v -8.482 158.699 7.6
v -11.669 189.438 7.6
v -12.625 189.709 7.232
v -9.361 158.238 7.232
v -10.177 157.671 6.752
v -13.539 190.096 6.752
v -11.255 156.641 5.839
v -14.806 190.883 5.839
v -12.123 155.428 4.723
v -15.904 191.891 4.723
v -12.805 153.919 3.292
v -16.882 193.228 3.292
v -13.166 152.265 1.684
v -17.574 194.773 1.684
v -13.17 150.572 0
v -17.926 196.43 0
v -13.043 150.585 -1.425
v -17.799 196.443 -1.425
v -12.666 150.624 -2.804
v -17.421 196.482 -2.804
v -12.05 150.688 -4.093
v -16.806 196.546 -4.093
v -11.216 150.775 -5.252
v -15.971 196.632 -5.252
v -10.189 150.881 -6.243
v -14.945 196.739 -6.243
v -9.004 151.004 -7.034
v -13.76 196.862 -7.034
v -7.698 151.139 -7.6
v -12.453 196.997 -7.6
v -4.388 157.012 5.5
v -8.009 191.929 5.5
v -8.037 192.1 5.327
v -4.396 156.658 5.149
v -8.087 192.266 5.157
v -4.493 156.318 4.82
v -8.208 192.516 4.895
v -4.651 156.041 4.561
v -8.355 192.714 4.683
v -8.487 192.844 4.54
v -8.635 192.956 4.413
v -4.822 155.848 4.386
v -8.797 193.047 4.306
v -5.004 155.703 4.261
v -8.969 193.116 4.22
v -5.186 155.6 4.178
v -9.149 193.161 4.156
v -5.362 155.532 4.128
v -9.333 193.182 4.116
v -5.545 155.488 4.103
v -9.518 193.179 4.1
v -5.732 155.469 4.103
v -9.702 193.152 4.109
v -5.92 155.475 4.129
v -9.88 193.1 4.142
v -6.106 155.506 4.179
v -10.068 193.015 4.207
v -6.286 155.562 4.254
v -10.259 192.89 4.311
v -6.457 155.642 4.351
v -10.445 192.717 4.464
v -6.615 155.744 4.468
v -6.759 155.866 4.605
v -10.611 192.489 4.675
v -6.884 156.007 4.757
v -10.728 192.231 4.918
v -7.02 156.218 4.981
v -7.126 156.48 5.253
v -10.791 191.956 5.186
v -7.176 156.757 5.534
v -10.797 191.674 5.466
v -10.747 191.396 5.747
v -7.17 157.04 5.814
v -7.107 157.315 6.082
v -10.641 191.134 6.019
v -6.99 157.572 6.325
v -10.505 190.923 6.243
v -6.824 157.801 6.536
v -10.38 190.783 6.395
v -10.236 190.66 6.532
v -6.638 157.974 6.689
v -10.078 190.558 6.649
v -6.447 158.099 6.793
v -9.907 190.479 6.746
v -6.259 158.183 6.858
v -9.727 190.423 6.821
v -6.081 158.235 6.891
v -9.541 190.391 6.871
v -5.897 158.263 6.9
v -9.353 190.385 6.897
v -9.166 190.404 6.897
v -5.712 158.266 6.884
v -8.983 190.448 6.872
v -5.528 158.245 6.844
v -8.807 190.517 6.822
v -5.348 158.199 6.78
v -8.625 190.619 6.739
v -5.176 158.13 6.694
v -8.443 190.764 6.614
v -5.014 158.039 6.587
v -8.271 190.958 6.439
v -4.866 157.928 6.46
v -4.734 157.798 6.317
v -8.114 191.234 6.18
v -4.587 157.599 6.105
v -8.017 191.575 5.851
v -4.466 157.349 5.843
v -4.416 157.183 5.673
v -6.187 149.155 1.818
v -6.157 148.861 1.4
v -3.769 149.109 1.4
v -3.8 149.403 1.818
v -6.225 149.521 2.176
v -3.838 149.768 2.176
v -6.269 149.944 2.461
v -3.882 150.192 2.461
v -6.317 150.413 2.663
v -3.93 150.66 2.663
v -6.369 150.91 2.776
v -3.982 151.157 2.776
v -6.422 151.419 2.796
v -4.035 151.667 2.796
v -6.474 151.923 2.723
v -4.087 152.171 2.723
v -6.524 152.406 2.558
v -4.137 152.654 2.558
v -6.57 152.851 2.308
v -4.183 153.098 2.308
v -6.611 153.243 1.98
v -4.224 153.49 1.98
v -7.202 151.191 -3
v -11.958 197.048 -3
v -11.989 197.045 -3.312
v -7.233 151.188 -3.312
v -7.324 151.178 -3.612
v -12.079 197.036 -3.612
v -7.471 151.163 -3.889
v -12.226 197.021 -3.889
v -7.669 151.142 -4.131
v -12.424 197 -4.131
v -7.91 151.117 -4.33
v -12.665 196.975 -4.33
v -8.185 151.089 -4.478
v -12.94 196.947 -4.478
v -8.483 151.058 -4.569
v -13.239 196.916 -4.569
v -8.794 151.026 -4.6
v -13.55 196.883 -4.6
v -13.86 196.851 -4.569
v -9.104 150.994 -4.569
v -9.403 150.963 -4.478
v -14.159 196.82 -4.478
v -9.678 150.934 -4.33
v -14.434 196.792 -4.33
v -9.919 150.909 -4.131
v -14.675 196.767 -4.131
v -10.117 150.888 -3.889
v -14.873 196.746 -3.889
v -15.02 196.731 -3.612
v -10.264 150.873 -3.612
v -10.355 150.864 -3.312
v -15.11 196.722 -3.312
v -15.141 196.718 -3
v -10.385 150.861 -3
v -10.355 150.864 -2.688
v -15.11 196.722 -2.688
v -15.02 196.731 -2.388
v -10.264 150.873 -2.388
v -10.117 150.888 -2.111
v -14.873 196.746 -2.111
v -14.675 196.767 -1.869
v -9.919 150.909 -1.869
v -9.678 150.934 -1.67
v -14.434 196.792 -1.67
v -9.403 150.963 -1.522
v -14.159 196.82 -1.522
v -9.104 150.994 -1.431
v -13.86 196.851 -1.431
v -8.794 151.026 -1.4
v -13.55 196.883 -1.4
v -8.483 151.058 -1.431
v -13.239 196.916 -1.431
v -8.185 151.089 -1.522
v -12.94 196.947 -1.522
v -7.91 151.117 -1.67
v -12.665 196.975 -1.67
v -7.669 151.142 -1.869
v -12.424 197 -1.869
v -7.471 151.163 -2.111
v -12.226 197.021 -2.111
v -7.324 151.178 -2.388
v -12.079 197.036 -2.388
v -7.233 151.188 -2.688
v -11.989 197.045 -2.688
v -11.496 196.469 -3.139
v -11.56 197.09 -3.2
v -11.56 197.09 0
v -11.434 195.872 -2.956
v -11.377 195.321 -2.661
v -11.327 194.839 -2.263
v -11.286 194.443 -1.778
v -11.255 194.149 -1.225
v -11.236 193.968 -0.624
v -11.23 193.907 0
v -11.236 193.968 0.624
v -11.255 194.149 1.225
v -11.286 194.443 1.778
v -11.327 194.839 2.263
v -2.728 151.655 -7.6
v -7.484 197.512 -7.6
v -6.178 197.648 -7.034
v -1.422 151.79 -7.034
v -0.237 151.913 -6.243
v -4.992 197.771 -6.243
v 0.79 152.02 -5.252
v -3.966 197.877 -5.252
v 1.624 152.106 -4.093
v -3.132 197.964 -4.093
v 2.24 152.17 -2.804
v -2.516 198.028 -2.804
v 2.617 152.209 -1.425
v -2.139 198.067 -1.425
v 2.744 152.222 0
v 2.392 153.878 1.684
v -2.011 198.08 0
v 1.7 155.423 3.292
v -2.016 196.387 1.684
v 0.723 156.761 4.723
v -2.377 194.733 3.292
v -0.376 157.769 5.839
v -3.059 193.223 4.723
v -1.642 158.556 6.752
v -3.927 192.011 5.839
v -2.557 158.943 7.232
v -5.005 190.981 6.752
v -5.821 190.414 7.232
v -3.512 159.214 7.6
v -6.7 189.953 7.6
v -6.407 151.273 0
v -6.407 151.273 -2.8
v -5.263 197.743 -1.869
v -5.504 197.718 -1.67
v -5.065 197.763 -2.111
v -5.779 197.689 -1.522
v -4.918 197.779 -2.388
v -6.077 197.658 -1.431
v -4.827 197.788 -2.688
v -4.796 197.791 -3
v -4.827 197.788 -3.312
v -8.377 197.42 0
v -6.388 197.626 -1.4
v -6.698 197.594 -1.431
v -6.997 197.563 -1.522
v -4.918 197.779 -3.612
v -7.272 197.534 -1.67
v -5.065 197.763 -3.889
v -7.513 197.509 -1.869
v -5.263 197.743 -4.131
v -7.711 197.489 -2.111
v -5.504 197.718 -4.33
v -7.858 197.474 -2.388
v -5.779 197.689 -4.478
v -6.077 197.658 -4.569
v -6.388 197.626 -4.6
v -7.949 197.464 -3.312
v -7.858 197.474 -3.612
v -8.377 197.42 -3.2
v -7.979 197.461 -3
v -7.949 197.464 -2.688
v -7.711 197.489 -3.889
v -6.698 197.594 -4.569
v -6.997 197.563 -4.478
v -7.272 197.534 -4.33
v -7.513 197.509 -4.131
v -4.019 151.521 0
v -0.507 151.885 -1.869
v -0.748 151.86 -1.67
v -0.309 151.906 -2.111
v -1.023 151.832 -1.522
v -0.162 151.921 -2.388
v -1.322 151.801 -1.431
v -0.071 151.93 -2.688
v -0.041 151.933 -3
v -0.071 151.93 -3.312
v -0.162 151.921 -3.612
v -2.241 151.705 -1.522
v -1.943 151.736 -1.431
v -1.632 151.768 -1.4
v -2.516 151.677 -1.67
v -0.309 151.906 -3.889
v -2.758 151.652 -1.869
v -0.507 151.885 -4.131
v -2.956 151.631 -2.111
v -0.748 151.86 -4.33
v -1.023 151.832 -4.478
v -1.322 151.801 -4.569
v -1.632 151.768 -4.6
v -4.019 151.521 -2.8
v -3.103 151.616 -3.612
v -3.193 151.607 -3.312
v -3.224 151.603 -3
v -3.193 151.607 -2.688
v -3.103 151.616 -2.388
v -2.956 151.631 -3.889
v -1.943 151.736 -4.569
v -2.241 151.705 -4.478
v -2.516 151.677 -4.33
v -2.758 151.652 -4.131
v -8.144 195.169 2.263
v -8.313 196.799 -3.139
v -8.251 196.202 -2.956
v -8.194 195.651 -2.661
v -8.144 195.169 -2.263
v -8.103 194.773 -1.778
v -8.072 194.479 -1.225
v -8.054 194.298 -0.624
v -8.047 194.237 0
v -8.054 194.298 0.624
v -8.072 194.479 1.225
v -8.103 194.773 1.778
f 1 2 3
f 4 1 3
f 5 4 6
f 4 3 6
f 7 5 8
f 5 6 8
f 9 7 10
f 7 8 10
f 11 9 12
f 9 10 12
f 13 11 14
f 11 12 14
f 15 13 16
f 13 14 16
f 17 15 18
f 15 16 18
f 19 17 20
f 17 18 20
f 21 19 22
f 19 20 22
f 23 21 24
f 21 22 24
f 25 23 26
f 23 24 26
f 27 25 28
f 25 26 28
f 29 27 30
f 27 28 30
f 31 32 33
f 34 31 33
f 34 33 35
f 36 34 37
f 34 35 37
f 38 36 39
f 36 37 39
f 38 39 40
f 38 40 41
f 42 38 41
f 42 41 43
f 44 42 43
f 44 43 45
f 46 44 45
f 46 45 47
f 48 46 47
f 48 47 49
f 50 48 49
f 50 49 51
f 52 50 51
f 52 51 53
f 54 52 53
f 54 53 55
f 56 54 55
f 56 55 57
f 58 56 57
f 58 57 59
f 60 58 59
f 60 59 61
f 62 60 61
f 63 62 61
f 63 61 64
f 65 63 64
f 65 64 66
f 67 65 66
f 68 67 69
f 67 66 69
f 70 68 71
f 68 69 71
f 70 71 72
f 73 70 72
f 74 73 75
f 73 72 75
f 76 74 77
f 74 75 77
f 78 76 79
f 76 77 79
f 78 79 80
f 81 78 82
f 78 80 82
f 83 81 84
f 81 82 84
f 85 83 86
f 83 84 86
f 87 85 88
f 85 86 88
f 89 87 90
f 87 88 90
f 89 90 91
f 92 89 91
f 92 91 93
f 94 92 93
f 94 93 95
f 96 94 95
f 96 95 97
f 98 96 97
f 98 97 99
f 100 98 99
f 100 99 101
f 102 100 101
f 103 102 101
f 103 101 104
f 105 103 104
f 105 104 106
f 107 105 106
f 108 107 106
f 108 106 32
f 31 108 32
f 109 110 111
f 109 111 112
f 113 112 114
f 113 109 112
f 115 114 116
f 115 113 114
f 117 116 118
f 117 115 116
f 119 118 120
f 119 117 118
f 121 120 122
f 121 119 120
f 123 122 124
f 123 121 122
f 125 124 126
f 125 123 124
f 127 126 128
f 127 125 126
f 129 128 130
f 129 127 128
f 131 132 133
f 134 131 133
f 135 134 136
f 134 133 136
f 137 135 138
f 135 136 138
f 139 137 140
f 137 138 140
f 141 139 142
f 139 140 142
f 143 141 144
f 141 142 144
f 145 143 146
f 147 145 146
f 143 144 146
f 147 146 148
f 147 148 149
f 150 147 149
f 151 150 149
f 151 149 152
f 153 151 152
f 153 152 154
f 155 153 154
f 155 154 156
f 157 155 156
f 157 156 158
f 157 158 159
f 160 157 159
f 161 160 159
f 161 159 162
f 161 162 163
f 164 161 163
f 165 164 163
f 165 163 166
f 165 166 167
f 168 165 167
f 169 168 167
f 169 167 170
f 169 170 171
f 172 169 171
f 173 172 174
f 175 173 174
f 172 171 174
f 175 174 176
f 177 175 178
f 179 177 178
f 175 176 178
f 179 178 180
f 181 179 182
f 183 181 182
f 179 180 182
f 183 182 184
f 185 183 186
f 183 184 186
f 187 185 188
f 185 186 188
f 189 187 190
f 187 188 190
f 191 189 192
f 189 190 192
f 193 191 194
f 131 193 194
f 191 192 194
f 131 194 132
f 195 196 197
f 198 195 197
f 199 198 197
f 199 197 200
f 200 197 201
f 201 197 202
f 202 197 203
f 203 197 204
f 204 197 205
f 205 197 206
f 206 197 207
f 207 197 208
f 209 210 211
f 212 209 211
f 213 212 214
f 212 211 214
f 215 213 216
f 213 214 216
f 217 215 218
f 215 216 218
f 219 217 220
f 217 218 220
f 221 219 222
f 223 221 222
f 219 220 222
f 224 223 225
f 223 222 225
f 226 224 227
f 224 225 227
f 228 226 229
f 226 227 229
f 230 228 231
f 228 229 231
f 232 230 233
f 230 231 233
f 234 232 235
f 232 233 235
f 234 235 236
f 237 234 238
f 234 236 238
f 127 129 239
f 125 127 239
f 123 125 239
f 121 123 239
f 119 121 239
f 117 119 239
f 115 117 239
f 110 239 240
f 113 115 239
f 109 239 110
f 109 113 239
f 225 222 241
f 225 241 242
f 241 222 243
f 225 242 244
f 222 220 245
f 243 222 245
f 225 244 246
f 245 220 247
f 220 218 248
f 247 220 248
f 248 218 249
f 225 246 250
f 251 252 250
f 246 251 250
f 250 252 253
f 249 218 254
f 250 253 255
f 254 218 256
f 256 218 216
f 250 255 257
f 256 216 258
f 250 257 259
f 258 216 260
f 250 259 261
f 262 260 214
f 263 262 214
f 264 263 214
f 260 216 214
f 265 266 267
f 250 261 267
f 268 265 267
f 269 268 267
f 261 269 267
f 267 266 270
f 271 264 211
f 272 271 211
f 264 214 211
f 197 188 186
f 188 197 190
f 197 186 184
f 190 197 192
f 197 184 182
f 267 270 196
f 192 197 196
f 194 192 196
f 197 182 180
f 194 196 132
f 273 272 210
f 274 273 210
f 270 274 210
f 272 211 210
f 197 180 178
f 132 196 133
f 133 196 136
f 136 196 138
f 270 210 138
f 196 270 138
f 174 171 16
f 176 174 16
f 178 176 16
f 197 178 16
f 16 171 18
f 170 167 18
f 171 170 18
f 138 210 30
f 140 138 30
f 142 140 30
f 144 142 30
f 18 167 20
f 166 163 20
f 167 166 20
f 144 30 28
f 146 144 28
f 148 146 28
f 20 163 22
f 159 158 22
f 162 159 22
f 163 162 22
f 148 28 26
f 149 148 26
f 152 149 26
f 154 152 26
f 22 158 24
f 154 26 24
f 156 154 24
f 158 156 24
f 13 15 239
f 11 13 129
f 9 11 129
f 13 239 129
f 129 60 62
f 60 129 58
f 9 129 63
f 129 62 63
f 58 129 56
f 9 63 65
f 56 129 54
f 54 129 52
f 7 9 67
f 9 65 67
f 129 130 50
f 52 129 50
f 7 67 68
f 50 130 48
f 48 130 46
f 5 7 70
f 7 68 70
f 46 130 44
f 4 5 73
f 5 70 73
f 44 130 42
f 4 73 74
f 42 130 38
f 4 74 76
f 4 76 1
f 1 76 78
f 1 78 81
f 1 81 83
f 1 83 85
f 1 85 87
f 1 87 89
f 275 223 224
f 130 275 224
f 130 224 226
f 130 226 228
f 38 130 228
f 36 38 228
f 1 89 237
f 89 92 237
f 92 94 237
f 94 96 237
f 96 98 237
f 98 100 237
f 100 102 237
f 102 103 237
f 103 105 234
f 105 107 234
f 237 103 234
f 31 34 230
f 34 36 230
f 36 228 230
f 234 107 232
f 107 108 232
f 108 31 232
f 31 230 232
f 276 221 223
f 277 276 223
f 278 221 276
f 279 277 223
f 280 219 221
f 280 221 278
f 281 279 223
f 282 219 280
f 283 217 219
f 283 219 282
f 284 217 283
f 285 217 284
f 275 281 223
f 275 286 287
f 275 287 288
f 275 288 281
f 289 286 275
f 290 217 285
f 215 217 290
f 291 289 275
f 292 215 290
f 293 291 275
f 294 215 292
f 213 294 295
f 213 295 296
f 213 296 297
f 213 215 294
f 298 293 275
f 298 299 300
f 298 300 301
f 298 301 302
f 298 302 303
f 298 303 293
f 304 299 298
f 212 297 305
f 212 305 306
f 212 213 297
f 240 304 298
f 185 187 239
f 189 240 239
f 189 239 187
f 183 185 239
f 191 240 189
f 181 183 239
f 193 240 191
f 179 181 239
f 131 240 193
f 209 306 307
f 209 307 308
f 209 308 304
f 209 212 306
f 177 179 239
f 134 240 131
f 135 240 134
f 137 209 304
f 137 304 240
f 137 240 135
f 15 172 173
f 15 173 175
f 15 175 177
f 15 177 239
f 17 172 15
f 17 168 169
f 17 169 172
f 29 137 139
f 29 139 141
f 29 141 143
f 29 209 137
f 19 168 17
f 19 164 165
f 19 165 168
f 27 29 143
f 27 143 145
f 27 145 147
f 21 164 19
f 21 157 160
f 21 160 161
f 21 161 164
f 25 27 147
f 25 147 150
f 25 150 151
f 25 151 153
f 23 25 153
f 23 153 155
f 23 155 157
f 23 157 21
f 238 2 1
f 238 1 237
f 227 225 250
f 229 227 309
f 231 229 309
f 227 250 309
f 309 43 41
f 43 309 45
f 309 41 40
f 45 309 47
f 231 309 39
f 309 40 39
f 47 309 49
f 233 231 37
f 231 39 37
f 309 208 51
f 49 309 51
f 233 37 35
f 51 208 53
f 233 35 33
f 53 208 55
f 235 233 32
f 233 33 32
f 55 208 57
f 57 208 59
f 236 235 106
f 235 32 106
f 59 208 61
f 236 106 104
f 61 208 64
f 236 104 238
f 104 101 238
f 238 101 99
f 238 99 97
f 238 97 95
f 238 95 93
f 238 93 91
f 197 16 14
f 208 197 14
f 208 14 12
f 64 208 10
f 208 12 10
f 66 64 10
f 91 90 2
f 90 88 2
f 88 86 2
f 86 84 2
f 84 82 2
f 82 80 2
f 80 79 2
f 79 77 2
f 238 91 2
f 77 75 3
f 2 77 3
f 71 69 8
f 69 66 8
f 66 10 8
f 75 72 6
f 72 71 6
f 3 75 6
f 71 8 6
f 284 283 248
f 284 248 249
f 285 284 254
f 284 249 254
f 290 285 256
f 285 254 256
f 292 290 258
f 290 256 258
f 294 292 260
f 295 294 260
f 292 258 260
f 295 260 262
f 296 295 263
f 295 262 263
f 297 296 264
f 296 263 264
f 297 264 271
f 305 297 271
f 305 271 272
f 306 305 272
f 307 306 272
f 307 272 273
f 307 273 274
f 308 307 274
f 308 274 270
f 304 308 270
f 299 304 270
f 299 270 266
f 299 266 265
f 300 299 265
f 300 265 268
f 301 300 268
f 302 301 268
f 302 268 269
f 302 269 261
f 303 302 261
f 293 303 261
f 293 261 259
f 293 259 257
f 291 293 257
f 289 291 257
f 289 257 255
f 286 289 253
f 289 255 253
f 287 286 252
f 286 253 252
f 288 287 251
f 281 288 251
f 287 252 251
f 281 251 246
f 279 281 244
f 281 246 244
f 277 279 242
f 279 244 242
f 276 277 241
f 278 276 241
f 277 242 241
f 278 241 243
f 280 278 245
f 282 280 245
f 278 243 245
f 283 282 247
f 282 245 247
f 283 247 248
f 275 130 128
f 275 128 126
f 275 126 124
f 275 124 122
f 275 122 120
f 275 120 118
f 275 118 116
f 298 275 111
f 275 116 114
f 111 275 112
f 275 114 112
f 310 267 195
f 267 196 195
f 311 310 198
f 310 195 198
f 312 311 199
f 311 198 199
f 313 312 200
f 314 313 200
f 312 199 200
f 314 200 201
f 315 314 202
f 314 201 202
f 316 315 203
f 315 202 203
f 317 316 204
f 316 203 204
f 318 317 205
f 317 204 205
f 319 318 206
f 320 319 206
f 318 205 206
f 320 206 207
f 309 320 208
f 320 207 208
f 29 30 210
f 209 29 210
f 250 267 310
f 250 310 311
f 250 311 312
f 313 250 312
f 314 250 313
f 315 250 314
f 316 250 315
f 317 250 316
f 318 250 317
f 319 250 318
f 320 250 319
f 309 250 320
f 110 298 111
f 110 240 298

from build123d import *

# Parameters (mm, degrees)
SKETCH3_R               = 8
BOSS_EXTRUDE1_DEPTH     = 46.103684211
CUT_EXTRUDE1_DEPTH      = 13.730251515
CUT_EXTRUDE1_DEPTH_BACK = 13.730251515
BOSS_EXTRUDE2_DEPTH     = 1.2
CUT_EXTRUDE2_DEPTH      = 1.6
SKETCH8_R               = 1.4
SKETCH8_R_2             = 1.6
CUT_EXTRUDE3_DEPTH      = 2.64160469
CUT_EXTRUDE3_DEPTH_BACK = 50.446677335
CUT_EXTRUDE4_DEPTH      = 50.446677335


with BuildPart() as part:
    # Sketch3 → Boss-Extrude1 (new body)
    with BuildSketch(Plane(origin=(-20.344467381, 196.178792599, 0), x_dir=(-0.994665758, -0.103150523, 0), z_dir=(0.103150523, -0.994665758, 0))):
        with Locations((-10.431405186, 0)):
            Circle(SKETCH3_R)
    extrude(amount=BOSS_EXTRUDE1_DEPTH)

    # Sketch4 → Cut-Extrude1 (cut, two sides)
    with BuildSketch(Plane(origin=(10.375761543, 1.076004901, 0), x_dir=(0.103150523, -0.994665758, 0), z_dir=(-0.994665758, -0.103150523, 0))) as cut_extrude1_sk:
        Polygon((-197.230869842, 0), (-189.230869842, 8), (-197.230869842, 8), align=None)
        Polygon((-159.127185631, 8), (-151.127185631, 8), (-151.127185631, 0), align=None)
    extrude(amount=CUT_EXTRUDE1_DEPTH, mode=Mode.SUBTRACT)
    extrude(cut_extrude1_sk.sketch, amount=-CUT_EXTRUDE1_DEPTH_BACK, mode=Mode.SUBTRACT)

    # Sketch5 → Boss-Extrude2 (add, symmetric)
    with BuildSketch(Plane(origin=(10.375761543, 1.076004901, 0), x_dir=(0.103150523, -0.994665758, 0), z_dir=(-0.994665758, -0.103150523, 0))):
        with BuildLine():
            Line((-151.127185631, -2.8), (-148.702314501, 1.4))
            ThreePointArc((-148.702314501, 1.4), (-150.761712293, 2.776045612), (-153.107084619, 1.979898987))
            Line((-153.107084619, 1.979898987), (-151.127185631, 0))
            Line((-151.127185631, 0), (-151.127185631, -2.8))
        make_face()
    extrude(amount=BOSS_EXTRUDE2_DEPTH, both=True)

    # Sketch7 → Cut-Extrude2 (cut, symmetric)
    with BuildSketch(Plane(origin=(10.375761543, 1.076004901, 0), x_dir=(0.103150523, -0.994665758, 0), z_dir=(-0.994665758, -0.103150523, 0))):
        with BuildLine():
            Line((-194.968128142, 2.2627417), (-197.230869842, 0))
            Line((-197.230869842, 0), (-197.230869842, -3.2))
            ThreePointArc((-197.230869842, -3.2), (-194.274455338, -1.224586984), (-194.968128142, 2.2627417))
        make_face()
    extrude(amount=CUT_EXTRUDE2_DEPTH, both=True, mode=Mode.SUBTRACT)

    # Sketch8 → Cut-Extrude3 (cut, two sides)
    with BuildSketch(Plane(origin=(-20.344467381, 196.178792599, 0), x_dir=(0.994665758, 0.103150523, 0), z_dir=(-0.103150523, 0.994665758, 0))) as cut_extrude3_sk:
        with Locations((10.431405186, -5.5)):
            Circle(SKETCH8_R)
        with Locations((6.831405186, 3)):
            Circle(SKETCH8_R_2)
        with Locations((14.031405186, 3)):
            Circle(SKETCH8_R_2)
    extrude(amount=CUT_EXTRUDE3_DEPTH, mode=Mode.SUBTRACT)
    extrude(cut_extrude3_sk.sketch, amount=-CUT_EXTRUDE3_DEPTH_BACK, mode=Mode.SUBTRACT)

    # Sketch9 → Cut-Extrude4 (cut, through all)
    with BuildSketch(Plane(origin=(-20.344467381, 196.178792599, 0), x_dir=(0.994665758, 0.103150523, 0), z_dir=(-0.103150523, 0.994665758, 0))):
        with BuildLine():
            Line((7.933405986, 7.6), (12.929404385, 7.6))
            ThreePointArc((12.929404385, 7.6), (10.431405186, 8), (7.933405986, 7.6))
        make_face()
        with BuildLine():
            Line((7.933405986, -7.6), (12.929404385, -7.6))
            ThreePointArc((12.929404385, -7.6), (10.431405186, -8), (7.933405986, -7.6))
        make_face()
    extrude(amount=-CUT_EXTRUDE4_DEPTH, mode=Mode.SUBTRACT)


solid = part.part
